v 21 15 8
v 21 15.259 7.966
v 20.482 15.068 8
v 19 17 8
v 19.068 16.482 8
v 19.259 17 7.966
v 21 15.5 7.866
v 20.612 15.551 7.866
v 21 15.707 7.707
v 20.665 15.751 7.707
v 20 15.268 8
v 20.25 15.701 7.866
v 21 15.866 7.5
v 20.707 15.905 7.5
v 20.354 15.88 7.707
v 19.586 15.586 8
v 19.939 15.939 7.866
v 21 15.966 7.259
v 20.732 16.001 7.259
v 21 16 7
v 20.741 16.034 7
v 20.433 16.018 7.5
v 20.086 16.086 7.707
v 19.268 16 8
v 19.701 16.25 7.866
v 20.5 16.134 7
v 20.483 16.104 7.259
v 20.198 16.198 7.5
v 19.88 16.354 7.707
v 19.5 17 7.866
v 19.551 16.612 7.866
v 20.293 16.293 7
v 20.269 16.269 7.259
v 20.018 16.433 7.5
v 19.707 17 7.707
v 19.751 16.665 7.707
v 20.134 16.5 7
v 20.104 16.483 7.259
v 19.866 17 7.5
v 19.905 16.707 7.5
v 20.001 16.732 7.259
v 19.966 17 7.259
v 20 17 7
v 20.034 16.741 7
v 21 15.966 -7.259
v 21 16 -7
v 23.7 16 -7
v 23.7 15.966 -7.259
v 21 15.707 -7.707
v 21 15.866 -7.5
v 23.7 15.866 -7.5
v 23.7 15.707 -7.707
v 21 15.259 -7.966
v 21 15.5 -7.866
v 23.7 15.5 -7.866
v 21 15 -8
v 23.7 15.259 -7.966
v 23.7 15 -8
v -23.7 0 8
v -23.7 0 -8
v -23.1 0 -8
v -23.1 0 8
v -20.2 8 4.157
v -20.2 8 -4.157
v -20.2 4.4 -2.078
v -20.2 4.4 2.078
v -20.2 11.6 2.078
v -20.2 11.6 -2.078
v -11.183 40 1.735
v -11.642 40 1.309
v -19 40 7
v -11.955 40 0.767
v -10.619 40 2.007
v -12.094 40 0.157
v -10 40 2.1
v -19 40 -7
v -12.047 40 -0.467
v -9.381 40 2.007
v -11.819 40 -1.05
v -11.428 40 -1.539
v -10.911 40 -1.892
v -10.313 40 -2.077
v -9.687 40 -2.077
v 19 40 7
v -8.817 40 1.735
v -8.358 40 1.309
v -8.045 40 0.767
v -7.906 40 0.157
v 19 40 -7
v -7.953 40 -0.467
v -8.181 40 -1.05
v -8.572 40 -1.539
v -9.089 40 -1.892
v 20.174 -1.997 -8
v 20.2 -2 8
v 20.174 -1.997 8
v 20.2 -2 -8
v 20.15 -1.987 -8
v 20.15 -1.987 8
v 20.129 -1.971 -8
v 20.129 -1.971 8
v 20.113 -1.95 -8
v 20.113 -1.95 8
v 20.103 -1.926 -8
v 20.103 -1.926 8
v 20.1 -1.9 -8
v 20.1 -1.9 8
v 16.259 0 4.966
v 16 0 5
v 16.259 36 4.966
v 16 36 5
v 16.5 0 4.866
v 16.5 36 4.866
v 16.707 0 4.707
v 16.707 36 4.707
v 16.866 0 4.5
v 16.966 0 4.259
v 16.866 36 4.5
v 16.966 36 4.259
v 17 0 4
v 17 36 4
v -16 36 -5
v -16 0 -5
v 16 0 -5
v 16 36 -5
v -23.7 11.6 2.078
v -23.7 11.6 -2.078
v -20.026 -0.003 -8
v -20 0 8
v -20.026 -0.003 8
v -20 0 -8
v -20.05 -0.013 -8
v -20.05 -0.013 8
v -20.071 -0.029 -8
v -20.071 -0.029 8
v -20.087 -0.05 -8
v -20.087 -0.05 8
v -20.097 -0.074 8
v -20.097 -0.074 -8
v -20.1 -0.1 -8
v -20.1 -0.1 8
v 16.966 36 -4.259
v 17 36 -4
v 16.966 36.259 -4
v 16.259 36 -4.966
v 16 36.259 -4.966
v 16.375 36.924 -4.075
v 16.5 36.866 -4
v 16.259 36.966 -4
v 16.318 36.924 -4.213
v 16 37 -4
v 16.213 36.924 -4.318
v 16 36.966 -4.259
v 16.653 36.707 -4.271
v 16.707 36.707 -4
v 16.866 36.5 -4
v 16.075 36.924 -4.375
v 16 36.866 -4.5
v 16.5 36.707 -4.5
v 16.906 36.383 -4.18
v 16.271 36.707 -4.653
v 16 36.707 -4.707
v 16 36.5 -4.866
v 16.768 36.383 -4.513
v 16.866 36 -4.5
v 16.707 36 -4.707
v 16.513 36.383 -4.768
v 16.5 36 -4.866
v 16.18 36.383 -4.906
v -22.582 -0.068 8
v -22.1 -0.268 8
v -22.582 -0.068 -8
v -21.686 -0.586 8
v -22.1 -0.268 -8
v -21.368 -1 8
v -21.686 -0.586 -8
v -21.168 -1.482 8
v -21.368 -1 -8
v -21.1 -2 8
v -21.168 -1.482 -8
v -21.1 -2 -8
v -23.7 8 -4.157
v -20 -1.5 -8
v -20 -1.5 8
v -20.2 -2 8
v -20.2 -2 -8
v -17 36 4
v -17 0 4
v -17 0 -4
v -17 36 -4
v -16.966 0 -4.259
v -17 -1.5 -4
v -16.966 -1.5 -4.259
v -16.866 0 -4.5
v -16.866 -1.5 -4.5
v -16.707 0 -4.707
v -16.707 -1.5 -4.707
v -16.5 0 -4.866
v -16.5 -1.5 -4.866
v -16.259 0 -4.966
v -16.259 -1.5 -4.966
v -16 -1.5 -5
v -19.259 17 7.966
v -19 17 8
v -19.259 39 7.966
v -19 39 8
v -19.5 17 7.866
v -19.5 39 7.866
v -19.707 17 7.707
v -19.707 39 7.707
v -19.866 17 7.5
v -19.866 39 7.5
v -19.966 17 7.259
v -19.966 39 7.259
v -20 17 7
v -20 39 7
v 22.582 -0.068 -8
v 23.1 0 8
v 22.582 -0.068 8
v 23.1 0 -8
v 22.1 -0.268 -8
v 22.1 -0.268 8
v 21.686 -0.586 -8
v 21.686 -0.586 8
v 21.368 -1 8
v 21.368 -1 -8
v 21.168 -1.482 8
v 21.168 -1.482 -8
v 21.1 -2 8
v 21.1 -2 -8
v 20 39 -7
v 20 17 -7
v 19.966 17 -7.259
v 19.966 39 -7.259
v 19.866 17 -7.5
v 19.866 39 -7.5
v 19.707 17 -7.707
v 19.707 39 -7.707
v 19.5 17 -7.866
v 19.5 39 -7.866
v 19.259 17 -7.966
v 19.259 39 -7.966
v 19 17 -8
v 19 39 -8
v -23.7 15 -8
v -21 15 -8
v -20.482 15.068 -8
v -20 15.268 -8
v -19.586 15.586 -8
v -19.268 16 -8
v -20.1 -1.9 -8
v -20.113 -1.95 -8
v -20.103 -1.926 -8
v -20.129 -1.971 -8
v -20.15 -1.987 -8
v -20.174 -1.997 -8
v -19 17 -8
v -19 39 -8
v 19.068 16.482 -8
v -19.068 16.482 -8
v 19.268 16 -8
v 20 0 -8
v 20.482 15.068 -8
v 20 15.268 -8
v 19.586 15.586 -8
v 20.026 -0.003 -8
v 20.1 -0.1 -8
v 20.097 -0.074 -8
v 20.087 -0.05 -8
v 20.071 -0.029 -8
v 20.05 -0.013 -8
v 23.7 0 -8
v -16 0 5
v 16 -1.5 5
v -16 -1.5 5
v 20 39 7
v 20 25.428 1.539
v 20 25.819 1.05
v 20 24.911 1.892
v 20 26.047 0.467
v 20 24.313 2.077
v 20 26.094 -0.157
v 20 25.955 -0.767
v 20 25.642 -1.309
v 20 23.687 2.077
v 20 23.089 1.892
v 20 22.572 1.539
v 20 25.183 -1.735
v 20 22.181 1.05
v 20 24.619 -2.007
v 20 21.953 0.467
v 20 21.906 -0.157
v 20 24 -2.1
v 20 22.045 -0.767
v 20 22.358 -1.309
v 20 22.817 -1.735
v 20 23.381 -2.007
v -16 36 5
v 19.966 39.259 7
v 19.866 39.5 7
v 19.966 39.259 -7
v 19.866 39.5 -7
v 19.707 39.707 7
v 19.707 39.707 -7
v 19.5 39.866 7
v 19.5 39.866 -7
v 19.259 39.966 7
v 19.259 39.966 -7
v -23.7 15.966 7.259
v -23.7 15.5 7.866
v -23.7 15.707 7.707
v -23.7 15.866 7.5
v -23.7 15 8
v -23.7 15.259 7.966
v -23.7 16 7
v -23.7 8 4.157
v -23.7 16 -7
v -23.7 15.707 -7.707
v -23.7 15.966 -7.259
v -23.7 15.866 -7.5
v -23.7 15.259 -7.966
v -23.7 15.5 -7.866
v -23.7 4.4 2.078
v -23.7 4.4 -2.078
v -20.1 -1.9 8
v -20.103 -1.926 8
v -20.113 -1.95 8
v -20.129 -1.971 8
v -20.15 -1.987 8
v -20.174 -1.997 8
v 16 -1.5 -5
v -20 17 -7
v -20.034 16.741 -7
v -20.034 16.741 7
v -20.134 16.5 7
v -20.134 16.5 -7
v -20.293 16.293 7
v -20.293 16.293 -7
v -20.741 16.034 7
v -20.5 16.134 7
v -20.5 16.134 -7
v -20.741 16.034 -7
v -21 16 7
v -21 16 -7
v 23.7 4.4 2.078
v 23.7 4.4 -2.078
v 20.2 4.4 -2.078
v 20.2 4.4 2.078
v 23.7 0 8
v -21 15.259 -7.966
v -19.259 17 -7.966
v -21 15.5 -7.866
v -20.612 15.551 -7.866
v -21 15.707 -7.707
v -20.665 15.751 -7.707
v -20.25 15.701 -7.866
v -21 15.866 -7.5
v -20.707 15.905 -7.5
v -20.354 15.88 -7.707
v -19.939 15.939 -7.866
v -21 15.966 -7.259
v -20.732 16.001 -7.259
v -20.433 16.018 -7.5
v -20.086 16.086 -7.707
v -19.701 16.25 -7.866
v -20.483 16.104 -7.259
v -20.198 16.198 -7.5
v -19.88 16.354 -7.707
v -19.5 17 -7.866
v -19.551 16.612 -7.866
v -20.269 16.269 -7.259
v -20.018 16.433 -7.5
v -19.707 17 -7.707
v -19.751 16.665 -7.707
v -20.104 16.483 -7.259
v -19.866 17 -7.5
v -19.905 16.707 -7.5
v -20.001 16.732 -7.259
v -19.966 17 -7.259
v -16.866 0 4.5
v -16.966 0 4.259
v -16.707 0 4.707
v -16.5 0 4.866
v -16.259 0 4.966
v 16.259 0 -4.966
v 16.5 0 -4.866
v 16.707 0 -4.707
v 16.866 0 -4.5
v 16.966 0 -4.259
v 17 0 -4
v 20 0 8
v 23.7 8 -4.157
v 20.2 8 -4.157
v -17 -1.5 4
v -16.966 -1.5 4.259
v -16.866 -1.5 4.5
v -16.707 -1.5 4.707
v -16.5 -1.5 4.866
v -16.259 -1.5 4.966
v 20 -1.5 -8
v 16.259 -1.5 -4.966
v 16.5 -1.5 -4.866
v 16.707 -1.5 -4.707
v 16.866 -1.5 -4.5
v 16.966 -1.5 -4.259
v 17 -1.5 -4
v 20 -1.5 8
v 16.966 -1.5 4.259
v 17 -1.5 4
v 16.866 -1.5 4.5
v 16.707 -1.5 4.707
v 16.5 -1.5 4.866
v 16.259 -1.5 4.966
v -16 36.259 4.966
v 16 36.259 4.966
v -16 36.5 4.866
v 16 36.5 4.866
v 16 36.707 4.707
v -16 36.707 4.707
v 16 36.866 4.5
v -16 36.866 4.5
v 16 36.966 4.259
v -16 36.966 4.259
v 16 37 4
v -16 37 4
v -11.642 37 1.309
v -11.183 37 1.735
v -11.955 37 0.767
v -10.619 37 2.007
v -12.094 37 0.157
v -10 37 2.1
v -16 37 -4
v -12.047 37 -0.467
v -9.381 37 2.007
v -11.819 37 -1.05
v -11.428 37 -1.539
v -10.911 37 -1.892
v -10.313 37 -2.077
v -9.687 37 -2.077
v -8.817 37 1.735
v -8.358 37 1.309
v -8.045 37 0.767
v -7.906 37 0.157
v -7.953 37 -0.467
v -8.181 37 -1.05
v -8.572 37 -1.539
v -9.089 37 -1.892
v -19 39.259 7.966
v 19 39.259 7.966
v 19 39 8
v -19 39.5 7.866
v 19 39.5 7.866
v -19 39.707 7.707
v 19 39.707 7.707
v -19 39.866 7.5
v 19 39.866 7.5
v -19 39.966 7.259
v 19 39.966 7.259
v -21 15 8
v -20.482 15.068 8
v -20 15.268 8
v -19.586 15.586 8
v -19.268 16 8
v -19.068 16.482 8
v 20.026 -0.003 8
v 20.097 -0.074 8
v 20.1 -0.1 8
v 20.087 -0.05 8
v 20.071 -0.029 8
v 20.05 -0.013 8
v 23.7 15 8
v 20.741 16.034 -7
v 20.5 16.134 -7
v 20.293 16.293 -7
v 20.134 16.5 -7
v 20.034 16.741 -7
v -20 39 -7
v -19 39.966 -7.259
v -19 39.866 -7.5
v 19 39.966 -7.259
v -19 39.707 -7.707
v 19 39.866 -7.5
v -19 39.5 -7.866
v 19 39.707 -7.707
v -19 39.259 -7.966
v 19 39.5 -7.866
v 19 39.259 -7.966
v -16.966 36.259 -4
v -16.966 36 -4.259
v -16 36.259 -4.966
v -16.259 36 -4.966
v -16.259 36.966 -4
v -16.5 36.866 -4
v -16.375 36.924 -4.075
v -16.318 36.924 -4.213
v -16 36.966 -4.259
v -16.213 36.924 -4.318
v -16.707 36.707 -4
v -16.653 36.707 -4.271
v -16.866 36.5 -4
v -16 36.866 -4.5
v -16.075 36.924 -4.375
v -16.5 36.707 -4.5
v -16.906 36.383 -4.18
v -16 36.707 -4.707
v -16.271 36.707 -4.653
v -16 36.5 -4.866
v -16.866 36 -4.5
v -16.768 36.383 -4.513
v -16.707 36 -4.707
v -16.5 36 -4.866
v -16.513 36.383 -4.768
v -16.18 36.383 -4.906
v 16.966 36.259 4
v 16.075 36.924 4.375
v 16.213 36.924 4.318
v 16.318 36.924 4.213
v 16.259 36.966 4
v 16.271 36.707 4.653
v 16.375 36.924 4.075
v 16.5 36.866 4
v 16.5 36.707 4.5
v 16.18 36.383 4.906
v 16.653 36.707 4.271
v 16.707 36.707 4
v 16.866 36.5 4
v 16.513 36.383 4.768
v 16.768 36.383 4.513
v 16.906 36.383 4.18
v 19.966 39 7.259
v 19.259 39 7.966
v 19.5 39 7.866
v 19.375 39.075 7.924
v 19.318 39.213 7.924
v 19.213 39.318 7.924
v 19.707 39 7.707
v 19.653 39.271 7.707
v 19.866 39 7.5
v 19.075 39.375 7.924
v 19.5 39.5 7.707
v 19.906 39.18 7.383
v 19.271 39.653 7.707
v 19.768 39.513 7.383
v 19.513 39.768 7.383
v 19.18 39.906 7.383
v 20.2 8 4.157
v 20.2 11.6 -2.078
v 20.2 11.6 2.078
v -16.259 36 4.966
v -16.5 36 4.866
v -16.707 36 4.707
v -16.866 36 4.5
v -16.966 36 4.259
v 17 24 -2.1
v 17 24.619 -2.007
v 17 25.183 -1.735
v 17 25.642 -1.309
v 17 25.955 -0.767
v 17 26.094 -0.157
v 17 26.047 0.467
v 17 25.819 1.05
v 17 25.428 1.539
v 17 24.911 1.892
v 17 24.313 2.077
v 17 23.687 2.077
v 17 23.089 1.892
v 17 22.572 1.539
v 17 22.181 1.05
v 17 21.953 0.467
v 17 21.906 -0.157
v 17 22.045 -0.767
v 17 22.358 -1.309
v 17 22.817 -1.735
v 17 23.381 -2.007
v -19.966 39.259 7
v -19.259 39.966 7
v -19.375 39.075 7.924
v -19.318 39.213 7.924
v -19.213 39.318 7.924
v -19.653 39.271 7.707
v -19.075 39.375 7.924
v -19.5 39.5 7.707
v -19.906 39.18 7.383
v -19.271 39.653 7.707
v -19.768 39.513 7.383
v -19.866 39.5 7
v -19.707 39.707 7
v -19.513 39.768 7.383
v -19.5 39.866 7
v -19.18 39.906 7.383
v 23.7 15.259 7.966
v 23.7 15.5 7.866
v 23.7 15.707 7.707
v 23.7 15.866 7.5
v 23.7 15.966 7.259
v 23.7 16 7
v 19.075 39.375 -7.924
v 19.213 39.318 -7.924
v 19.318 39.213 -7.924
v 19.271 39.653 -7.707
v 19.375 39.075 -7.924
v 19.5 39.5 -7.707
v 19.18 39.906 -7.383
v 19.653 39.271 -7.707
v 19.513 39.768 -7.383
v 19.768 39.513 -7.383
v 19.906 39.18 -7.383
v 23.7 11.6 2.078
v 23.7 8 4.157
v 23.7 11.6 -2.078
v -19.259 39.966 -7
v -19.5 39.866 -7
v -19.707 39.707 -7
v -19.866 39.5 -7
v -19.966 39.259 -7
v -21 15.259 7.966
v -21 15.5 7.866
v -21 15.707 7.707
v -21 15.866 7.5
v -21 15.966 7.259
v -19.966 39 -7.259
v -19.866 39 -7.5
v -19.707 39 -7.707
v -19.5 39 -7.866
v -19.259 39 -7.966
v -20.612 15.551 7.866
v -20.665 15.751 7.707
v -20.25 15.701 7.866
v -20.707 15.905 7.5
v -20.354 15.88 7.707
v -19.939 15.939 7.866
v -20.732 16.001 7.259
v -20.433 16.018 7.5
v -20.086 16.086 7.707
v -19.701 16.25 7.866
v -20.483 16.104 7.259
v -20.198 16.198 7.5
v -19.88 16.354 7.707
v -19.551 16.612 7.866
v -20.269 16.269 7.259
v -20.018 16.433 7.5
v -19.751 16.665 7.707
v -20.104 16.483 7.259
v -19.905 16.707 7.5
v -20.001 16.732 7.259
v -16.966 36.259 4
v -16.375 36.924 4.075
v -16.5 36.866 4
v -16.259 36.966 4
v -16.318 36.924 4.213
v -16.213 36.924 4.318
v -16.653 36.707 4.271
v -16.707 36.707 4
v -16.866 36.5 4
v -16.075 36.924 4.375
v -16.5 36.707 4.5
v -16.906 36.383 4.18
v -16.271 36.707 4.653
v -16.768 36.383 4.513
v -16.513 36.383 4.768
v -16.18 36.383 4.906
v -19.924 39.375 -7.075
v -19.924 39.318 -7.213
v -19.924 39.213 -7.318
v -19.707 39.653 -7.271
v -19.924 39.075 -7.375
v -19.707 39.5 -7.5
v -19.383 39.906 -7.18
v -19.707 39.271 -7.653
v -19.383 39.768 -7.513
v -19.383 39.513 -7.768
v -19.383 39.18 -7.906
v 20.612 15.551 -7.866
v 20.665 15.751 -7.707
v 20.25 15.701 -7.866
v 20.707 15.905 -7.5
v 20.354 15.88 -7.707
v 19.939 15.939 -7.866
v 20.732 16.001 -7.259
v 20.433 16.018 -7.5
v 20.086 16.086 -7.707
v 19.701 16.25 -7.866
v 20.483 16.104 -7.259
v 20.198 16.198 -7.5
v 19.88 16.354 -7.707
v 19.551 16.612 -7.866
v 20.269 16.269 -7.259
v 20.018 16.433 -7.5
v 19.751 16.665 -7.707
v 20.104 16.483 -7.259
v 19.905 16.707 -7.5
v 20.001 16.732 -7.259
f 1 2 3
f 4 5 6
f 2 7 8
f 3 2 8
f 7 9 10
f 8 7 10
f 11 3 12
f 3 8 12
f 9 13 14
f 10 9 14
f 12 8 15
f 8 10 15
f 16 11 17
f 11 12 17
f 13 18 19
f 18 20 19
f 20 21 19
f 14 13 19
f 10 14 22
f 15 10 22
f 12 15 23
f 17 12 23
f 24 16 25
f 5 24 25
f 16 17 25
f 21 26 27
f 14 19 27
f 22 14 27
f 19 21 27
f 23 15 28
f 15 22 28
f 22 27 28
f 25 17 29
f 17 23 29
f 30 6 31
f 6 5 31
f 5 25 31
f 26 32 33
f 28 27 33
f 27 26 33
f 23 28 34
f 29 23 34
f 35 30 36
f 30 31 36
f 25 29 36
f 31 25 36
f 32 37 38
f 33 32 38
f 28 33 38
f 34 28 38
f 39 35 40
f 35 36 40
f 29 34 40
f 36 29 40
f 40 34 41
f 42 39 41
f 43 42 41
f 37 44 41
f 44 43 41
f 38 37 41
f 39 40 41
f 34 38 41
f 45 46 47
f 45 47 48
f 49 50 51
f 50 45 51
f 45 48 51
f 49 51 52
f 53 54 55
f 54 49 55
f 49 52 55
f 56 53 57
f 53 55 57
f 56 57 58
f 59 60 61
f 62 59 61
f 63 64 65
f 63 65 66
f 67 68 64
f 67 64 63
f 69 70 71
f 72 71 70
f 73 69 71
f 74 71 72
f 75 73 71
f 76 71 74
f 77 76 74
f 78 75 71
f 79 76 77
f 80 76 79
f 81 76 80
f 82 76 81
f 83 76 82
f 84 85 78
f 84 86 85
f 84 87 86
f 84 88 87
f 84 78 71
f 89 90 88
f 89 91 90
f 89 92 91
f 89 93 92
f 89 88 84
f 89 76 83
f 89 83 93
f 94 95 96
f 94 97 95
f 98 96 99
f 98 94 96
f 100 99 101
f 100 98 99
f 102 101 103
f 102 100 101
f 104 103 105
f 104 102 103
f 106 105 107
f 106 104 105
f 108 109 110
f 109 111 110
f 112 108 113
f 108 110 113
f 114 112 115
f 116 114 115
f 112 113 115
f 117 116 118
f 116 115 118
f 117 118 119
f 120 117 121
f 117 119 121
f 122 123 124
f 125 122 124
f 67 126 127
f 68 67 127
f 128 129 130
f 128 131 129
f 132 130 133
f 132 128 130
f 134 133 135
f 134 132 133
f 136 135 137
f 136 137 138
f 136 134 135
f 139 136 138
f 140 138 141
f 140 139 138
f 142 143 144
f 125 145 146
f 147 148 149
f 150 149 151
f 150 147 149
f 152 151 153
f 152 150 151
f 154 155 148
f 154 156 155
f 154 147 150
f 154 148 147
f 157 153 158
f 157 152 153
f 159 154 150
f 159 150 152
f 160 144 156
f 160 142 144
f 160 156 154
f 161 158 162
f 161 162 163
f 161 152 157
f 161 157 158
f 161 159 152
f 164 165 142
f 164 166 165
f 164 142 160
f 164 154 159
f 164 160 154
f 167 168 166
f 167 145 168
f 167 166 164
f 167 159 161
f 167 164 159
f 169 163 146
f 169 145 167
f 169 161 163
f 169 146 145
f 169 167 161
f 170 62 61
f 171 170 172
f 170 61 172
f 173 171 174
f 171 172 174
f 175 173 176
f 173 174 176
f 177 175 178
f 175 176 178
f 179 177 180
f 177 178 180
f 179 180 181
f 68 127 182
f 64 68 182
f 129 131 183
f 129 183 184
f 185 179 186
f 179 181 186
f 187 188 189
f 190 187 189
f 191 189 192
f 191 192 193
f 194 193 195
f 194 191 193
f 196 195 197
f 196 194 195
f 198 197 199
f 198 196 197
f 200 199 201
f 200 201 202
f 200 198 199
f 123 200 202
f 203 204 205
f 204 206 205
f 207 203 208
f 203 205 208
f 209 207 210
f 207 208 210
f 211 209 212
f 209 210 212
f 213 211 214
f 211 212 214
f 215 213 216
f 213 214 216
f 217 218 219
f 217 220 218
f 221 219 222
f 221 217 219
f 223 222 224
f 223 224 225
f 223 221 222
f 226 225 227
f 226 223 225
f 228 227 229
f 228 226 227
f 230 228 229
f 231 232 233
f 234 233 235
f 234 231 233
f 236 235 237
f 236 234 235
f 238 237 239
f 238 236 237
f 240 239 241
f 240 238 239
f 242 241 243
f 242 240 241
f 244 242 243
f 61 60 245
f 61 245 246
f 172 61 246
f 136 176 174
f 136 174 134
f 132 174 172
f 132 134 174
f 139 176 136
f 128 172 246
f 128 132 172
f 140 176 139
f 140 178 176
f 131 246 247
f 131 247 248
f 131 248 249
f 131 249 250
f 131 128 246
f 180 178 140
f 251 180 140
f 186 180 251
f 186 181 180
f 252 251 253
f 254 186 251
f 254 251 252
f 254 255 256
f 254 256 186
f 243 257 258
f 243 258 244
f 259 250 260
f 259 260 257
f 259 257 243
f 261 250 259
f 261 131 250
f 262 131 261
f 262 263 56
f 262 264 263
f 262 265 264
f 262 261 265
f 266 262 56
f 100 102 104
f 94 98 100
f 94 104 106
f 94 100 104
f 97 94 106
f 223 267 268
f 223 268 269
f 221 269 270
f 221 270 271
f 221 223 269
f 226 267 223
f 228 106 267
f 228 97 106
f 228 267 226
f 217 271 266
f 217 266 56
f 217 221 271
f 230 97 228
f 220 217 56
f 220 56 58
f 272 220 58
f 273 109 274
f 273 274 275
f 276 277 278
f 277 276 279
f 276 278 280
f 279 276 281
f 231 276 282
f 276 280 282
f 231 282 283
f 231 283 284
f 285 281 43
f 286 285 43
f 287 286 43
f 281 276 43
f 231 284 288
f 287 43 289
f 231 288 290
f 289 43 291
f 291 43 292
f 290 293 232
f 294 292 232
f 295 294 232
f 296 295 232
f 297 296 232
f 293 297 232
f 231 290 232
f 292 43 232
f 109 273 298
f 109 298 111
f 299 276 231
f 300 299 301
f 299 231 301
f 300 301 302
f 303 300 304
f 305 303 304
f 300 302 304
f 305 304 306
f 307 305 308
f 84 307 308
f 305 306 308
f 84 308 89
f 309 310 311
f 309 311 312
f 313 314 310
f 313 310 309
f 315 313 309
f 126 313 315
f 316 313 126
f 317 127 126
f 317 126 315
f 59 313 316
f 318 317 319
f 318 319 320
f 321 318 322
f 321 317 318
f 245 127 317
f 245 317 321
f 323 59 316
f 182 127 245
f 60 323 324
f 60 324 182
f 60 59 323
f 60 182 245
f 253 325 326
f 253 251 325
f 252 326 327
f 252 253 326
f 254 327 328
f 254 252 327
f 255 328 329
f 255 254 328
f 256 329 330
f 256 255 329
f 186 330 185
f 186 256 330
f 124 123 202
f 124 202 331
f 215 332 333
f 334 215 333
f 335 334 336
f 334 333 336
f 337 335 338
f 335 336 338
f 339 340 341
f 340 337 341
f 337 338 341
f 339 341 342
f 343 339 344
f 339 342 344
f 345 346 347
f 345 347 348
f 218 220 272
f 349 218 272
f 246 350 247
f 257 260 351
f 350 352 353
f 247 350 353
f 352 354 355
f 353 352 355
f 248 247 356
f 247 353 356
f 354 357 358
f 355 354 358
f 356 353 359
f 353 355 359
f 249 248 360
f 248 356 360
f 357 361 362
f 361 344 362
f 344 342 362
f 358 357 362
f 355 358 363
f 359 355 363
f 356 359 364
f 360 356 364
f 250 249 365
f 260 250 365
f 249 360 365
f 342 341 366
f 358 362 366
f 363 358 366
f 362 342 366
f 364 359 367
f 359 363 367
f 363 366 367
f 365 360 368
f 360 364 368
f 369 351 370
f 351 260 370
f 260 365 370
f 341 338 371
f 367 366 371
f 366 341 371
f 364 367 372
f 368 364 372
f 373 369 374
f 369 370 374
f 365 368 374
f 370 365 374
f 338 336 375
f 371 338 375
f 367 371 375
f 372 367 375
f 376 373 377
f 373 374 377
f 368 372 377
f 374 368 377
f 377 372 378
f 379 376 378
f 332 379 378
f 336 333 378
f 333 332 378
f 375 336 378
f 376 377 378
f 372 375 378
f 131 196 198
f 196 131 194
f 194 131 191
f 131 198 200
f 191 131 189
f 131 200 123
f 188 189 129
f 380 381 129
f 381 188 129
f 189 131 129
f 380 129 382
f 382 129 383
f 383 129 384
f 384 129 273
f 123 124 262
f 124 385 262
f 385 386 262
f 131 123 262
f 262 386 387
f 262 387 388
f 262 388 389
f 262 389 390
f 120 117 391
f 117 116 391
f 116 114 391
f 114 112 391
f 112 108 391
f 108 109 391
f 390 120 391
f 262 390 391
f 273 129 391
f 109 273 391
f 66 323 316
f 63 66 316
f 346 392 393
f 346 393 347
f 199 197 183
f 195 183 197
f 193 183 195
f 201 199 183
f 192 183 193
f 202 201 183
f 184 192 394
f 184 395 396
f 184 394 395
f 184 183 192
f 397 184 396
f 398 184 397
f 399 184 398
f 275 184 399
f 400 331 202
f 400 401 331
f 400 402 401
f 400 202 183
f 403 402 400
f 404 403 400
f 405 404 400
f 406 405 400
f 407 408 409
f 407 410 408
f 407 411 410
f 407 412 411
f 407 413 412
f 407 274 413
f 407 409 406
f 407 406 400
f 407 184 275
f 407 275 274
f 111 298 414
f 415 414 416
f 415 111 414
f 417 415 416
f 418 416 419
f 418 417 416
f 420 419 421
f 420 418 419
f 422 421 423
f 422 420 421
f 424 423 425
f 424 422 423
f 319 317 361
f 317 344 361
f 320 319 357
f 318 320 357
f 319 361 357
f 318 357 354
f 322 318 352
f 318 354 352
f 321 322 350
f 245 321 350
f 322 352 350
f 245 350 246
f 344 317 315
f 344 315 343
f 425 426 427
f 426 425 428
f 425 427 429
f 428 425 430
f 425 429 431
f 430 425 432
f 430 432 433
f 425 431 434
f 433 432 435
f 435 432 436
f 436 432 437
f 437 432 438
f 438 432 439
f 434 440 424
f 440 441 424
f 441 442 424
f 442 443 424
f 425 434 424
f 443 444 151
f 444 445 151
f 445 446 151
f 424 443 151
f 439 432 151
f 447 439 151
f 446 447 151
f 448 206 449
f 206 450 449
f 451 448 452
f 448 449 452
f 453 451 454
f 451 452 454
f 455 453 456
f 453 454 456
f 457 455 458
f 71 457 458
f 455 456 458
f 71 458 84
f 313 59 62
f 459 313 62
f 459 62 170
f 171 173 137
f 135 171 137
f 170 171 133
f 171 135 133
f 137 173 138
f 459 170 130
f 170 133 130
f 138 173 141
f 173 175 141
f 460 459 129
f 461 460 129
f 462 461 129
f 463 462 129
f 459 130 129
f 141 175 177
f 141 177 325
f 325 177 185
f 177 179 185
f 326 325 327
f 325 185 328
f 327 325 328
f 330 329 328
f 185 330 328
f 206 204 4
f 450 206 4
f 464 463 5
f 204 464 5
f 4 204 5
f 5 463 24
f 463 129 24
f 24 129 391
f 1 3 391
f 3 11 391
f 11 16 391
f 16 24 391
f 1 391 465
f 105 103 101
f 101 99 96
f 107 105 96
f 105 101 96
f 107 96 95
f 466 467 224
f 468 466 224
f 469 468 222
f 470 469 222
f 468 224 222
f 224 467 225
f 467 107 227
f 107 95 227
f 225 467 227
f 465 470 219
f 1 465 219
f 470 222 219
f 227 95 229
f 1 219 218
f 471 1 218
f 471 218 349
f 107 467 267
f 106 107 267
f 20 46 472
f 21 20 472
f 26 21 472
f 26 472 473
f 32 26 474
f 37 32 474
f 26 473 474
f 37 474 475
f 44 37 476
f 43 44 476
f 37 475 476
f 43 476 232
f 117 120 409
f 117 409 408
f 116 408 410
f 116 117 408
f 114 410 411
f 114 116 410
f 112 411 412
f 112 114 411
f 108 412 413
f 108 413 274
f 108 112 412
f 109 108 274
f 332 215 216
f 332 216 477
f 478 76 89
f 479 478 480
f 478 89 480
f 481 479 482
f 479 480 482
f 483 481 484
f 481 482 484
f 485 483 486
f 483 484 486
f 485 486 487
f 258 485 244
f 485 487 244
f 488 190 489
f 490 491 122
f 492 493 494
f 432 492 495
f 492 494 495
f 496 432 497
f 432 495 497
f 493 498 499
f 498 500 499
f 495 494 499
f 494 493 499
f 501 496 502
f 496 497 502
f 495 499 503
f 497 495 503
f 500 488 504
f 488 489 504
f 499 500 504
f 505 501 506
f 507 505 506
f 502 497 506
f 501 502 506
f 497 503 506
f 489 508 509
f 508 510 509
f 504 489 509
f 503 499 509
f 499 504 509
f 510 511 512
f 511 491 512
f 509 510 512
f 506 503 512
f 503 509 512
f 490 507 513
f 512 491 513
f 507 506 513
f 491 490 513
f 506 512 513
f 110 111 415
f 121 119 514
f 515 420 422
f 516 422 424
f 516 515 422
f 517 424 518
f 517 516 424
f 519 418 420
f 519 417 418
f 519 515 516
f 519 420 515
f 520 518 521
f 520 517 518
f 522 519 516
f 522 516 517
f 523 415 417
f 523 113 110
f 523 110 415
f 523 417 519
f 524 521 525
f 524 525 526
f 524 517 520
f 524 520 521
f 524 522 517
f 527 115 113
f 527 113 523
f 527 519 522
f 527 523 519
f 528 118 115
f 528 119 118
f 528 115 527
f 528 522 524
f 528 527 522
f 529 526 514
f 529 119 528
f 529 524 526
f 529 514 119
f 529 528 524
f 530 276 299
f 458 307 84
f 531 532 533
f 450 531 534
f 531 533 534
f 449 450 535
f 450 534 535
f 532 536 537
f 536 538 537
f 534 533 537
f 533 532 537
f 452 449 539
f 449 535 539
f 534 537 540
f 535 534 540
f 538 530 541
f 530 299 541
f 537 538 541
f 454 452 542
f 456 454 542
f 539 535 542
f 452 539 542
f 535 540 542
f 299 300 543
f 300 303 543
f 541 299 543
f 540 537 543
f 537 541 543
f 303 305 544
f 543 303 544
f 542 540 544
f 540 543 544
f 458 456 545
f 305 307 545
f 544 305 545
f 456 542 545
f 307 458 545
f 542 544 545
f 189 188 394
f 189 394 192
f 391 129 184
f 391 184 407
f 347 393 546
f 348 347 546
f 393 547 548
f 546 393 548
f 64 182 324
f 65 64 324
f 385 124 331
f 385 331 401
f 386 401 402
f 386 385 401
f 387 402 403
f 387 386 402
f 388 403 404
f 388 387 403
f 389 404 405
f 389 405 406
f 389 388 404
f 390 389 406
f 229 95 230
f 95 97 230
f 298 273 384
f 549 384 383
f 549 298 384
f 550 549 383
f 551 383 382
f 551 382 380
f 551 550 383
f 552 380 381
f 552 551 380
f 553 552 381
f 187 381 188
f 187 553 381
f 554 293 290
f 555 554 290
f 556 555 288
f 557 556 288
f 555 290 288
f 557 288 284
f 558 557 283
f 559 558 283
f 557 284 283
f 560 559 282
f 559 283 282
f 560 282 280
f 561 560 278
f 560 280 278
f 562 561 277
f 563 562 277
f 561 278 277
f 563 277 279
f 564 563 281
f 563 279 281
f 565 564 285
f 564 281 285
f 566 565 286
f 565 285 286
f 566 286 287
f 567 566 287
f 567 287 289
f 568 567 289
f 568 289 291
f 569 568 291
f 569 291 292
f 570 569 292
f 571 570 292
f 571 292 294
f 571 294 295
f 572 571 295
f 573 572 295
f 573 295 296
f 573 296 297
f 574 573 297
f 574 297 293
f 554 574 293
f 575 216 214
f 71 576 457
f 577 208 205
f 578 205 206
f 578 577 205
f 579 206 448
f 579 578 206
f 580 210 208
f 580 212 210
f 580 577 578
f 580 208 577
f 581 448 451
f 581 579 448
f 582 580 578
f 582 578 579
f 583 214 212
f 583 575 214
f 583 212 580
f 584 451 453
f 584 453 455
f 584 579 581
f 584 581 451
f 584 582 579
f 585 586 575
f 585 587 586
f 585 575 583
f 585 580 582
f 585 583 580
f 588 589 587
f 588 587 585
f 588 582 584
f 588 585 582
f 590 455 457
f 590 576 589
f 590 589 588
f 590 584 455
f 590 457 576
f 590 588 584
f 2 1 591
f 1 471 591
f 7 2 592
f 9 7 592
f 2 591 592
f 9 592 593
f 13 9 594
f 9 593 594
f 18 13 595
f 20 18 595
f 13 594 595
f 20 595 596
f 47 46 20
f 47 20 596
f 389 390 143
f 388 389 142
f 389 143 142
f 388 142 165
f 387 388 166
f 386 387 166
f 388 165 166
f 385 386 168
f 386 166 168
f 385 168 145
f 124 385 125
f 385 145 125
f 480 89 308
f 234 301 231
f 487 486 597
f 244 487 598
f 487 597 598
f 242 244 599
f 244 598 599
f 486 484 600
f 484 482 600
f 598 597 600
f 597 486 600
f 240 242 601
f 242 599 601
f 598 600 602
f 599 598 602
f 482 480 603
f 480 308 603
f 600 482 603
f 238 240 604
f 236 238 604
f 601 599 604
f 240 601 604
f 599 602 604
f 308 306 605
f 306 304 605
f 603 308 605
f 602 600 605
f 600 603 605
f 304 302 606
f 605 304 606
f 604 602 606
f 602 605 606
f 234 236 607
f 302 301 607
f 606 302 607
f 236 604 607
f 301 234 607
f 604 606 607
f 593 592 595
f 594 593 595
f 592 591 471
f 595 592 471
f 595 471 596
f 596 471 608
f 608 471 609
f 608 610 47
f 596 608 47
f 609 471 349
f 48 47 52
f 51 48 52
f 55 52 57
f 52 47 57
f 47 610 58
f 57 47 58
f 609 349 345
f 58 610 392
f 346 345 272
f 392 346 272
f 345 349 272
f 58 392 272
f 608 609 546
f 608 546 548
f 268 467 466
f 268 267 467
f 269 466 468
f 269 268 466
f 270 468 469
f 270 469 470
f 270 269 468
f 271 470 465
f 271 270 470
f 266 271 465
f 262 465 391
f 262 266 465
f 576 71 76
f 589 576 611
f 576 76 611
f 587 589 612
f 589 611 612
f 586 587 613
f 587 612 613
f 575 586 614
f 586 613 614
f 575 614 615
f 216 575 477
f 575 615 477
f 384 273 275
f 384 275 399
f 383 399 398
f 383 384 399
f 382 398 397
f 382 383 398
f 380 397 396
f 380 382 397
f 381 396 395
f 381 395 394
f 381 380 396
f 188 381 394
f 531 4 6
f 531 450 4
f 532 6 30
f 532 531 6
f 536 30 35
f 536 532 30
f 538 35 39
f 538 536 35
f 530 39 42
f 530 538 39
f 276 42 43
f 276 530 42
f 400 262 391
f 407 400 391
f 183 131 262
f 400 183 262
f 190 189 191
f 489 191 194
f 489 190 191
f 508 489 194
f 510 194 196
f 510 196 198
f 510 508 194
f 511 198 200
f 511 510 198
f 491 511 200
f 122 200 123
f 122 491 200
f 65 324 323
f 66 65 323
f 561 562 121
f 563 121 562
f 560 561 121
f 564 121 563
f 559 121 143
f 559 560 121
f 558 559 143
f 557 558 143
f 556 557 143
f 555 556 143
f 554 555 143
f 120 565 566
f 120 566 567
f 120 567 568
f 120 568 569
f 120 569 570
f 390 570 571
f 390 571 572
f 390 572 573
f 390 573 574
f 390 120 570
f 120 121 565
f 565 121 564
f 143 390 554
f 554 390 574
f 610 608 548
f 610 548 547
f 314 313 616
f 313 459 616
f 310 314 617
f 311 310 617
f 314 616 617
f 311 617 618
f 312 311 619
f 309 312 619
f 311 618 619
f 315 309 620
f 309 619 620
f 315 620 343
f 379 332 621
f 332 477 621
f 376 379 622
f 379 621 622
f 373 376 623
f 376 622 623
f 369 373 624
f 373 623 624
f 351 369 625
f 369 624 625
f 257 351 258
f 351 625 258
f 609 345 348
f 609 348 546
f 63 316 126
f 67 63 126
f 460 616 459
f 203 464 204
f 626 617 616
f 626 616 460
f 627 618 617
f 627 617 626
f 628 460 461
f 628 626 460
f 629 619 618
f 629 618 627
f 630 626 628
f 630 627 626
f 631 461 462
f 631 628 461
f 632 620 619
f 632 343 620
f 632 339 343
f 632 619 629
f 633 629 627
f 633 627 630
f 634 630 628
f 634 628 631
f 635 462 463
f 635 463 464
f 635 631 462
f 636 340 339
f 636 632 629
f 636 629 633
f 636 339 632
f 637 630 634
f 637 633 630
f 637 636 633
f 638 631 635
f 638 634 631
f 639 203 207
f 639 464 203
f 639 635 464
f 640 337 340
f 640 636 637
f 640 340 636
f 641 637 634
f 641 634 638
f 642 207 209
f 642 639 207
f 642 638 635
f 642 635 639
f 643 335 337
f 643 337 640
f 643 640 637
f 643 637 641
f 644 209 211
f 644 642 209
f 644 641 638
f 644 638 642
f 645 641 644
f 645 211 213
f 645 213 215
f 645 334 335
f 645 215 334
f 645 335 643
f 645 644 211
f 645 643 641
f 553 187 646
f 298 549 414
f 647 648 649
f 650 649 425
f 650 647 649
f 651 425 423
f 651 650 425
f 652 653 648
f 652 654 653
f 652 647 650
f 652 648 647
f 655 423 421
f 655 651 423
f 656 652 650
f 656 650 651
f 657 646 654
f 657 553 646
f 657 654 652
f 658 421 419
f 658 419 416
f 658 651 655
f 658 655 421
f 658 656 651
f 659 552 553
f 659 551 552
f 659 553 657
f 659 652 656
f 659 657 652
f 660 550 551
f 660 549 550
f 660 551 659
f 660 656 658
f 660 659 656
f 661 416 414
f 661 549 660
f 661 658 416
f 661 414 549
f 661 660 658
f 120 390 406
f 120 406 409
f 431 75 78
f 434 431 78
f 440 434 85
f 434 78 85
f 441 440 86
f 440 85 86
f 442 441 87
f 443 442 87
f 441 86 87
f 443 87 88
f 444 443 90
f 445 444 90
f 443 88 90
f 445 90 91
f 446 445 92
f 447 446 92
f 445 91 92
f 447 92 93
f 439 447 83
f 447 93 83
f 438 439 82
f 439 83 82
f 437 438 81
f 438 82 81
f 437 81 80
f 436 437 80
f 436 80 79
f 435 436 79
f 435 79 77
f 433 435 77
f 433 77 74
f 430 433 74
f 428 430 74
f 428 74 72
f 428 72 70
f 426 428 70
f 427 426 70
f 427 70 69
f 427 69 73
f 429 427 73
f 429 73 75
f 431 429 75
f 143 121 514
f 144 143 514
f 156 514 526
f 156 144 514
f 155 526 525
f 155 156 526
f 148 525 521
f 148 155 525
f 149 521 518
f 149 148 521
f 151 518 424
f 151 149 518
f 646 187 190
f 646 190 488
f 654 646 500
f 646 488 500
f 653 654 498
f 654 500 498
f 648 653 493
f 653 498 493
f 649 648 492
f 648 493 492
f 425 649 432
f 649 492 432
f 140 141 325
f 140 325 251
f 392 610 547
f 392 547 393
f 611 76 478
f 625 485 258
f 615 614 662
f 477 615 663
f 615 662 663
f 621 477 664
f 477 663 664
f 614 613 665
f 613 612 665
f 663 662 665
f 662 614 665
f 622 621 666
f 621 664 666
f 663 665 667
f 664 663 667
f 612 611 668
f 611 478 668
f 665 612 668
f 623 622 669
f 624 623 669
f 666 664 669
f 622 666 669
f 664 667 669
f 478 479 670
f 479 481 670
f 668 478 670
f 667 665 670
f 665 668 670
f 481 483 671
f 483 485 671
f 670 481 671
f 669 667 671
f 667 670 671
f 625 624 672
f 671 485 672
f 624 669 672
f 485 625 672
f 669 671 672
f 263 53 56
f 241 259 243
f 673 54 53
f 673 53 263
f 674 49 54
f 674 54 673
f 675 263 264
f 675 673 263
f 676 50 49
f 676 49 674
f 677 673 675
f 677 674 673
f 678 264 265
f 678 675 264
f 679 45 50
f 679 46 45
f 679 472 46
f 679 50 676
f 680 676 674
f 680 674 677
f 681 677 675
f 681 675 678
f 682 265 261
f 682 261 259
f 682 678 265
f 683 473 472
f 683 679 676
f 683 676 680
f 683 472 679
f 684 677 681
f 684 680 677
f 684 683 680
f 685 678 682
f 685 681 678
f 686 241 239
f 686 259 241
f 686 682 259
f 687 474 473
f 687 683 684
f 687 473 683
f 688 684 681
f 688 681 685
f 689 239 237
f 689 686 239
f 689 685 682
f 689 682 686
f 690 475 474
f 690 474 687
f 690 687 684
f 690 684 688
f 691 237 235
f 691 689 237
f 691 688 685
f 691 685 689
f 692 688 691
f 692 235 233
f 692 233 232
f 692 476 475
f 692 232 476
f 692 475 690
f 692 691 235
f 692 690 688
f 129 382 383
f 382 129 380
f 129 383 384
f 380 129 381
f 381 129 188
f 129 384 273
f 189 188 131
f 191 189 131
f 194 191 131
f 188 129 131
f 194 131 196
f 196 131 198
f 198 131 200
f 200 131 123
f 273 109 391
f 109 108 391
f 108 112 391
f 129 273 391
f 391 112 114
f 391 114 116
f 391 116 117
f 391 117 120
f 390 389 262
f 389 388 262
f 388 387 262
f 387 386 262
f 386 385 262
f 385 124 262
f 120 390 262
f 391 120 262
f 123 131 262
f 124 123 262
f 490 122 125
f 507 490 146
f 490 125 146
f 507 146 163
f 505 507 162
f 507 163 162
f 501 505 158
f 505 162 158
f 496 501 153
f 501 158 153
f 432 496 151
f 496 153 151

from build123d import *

# Parameters (mm, degrees)
SKETCH1_W               = 40
SKETCH1_H               = 16
BODY_DEPTH              = 40
SKETCH2_W               = 3.7
SKETCH2_H               = 16
EXTENSION_DEPTH         = 16
SKETCH5_W               = 34
SKETCH5_H               = 10
CAVITY_DEPTH            = 37
TOP_HOLE_REACH          = 49.177
SKETCH6_R               = 2.1
SIDE_HOLE_REACH         = 61.78
SKETCH7_R               = 2.1
SKETCH3_W               = 1
SKETCH3_H               = 16
LEGS_DEPTH              = 2
MOUNT_COUNTERBORE_DEPTH = 3.5
F_2MM_LEG_FILLET_R      = 2
F_0_1MM_LEG_FILLET_R    = 0.1
OUTER_BOUNDARY_FILLET_R = 1
INNER_BOUNDARY_FILLET_R = 1
SKETCH8_W               = 40
SKETCH8_H               = 16
BOSS_EXTRUDE1_DEPTH     = 1.5


with BuildPart() as part:
    # Sketch1 → Body (new body)
    with BuildSketch(Plane(origin=(0, 0, 0), x_dir=(1, 0, 0), z_dir=(0, 1, 0))):
        Rectangle(SKETCH1_W, SKETCH1_H)
    extrude(amount=BODY_DEPTH)

    # Sketch2 → Extension (add)
    with BuildSketch(Plane(origin=(0, 0, 0), x_dir=(1, 0, 0), z_dir=(0, 1, 0))):
        with Locations((-21.85, 0)):
            Rectangle(SKETCH2_W, SKETCH2_H)
        with Locations((21.85, 0)):
            Rectangle(SKETCH2_W, SKETCH2_H)
    extrude(amount=EXTENSION_DEPTH)

    # Sketch5 → Cavity (cut)
    with BuildSketch(Plane(origin=(0, 0, 0), x_dir=(1, 0, 0), z_dir=(0, 1, 0))):
        Rectangle(SKETCH5_W, SKETCH5_H)
    extrude(amount=CAVITY_DEPTH, mode=Mode.SUBTRACT)

    # Sketch6 → Top Hole (cut, up to next)
    with BuildSketch(Plane(origin=(0, 40, 0), x_dir=(1, 0, 0), z_dir=(0, 1, 0)), mode=Mode.PRIVATE) as top_hole_sk1:
        with Locations(Location((-10, 0, 0), (0, 0, 270))):
            Circle(SKETCH6_R)
    top_hole_tool1 = extrude(top_hole_sk1.sketch, amount=-TOP_HOLE_REACH, mode=Mode.PRIVATE) & part.part
    add(top_hole_tool1.solids().sort_by_distance((-10, 40, 0))[0], mode=Mode.SUBTRACT)

    # Sketch7 → Side Hole (cut, up to next)
    with BuildSketch(Plane(origin=(20, 0, 0), x_dir=(0, 0, -1), z_dir=(1, 0, 0)), mode=Mode.PRIVATE) as side_hole_sk1:
        with Locations((0, 24)):
            Circle(SKETCH7_R)
    side_hole_tool1 = extrude(side_hole_sk1.sketch, amount=-SIDE_HOLE_REACH, mode=Mode.PRIVATE) & part.part
    add(side_hole_tool1.solids().sort_by_distance((20, 24, 0))[0], mode=Mode.SUBTRACT)

    # Sketch3 → Legs (add)
    with BuildSketch(Plane(origin=(0, 0, 0), x_dir=(1, 0, 0), z_dir=(0, 1, 0))):
        with Locations((-20.6, 0)):
            Rectangle(SKETCH3_W, SKETCH3_H)
        with Locations((20.6, 0)):
            Rectangle(SKETCH3_W, SKETCH3_H)
    extrude(amount=-LEGS_DEPTH)

    # Sketch4 → Mount Counterbore (cut)
    with BuildSketch(Plane.ZY.offset(23.7)):
        Polygon((2.078460969, 11.6), (-2.078460969, 11.6), (-4.156921938, 8), (-2.078460969, 4.4), (2.078460969, 4.4), (4.156921938, 8), align=None)
    mount_counterbore = extrude(amount=-MOUNT_COUNTERBORE_DEPTH, mode=Mode.SUBTRACT)

    # Mount Counterbore Mirror: Mount Counterbore across plane
    add(mount_counterbore.mirror(Plane(origin=(0, 0, 0), x_dir=(0, 0, 1), z_dir=(1, 0, 0))), mode=Mode.SUBTRACT)

    # 2mm Leg Fillet
    f_2mm_leg_fillet_edges = [part.edges().sort_by_distance(p)[0] for p in [
        (-21.1, 0, 0),
        (21.1, 0, 0),
    ]]
    fillet(f_2mm_leg_fillet_edges, radius=F_2MM_LEG_FILLET_R - 0.0001)  # a hair under: the kernel refuses the full size

    # 0.1mm Leg Fillet
    f_0_1mm_leg_fillet_edges = [part.edges().sort_by_distance(p)[0] for p in [
        (-20.1, -2, 0),
        (-20.1, 0, 0),
        (20.1, -2, 0),
        (20.1, 0, 0),
    ]]
    fillet(f_0_1mm_leg_fillet_edges, radius=F_0_1MM_LEG_FILLET_R)

    # Outer Boundary Fillet
    outer_boundary_fillet_edges = [part.edges().sort_by_distance(p)[0] for p in [
        (20, 40, 0),
        (-20, 16, 0),
        (-21.85, 16, -8),
        (0, 40, -8),
        (-21.85, 16, 8),
        (20, 16, 0),
        (21.85, 16, 8),
        (21.85, 16, -8),
        (-20, 40, 0),
        (-20, 28, -8),
        (20, 28, -8),
        (20, 28, 8),
        (-20, 28, 8),
        (0, 40, 8),
    ]]
    fillet(outer_boundary_fillet_edges, radius=OUTER_BOUNDARY_FILLET_R)

    # Inner Boundary Fillet
    inner_boundary_fillet_edges = [part.edges().sort_by_distance(p)[0] for p in [
        (-17, 18.5, -5),
        (-17, 18.5, 5),
        (17, 18.5, 5),
        (17, 18.5, -5),
        (-17, 37, 0),
        (0, 37, 5),
        (17, 37, 0),
        (0, 37, -5),
    ]]
    fillet(inner_boundary_fillet_edges, radius=INNER_BOUNDARY_FILLET_R)


with BuildPart() as body_2:
    # Sketch8 → Boss-Extrude1 (new body)
    with BuildSketch(Plane.XZ):
        Rectangle(SKETCH8_W, SKETCH8_H)
        with BuildLine():
            Line((-16, -5), (16, -5))
            ThreePointArc((16, -5), (16.707106781, -4.707106781), (17, -4))
            Line((17, -4), (17, 4))
            ThreePointArc((17, 4), (16.707106781, 4.707106781), (16, 5))
            Line((16, 5), (-16, 5))
            ThreePointArc((-16, 5), (-16.707106781, 4.707106781), (-17, 4))
            Line((-17, 4), (-17, -4))
            ThreePointArc((-17, -4), (-16.707106781, -4.707106781), (-16, -5))
        make_face(mode=Mode.SUBTRACT)
    extrude(amount=BOSS_EXTRUDE1_DEPTH)


solid = Compound([part.part, body_2.part])
